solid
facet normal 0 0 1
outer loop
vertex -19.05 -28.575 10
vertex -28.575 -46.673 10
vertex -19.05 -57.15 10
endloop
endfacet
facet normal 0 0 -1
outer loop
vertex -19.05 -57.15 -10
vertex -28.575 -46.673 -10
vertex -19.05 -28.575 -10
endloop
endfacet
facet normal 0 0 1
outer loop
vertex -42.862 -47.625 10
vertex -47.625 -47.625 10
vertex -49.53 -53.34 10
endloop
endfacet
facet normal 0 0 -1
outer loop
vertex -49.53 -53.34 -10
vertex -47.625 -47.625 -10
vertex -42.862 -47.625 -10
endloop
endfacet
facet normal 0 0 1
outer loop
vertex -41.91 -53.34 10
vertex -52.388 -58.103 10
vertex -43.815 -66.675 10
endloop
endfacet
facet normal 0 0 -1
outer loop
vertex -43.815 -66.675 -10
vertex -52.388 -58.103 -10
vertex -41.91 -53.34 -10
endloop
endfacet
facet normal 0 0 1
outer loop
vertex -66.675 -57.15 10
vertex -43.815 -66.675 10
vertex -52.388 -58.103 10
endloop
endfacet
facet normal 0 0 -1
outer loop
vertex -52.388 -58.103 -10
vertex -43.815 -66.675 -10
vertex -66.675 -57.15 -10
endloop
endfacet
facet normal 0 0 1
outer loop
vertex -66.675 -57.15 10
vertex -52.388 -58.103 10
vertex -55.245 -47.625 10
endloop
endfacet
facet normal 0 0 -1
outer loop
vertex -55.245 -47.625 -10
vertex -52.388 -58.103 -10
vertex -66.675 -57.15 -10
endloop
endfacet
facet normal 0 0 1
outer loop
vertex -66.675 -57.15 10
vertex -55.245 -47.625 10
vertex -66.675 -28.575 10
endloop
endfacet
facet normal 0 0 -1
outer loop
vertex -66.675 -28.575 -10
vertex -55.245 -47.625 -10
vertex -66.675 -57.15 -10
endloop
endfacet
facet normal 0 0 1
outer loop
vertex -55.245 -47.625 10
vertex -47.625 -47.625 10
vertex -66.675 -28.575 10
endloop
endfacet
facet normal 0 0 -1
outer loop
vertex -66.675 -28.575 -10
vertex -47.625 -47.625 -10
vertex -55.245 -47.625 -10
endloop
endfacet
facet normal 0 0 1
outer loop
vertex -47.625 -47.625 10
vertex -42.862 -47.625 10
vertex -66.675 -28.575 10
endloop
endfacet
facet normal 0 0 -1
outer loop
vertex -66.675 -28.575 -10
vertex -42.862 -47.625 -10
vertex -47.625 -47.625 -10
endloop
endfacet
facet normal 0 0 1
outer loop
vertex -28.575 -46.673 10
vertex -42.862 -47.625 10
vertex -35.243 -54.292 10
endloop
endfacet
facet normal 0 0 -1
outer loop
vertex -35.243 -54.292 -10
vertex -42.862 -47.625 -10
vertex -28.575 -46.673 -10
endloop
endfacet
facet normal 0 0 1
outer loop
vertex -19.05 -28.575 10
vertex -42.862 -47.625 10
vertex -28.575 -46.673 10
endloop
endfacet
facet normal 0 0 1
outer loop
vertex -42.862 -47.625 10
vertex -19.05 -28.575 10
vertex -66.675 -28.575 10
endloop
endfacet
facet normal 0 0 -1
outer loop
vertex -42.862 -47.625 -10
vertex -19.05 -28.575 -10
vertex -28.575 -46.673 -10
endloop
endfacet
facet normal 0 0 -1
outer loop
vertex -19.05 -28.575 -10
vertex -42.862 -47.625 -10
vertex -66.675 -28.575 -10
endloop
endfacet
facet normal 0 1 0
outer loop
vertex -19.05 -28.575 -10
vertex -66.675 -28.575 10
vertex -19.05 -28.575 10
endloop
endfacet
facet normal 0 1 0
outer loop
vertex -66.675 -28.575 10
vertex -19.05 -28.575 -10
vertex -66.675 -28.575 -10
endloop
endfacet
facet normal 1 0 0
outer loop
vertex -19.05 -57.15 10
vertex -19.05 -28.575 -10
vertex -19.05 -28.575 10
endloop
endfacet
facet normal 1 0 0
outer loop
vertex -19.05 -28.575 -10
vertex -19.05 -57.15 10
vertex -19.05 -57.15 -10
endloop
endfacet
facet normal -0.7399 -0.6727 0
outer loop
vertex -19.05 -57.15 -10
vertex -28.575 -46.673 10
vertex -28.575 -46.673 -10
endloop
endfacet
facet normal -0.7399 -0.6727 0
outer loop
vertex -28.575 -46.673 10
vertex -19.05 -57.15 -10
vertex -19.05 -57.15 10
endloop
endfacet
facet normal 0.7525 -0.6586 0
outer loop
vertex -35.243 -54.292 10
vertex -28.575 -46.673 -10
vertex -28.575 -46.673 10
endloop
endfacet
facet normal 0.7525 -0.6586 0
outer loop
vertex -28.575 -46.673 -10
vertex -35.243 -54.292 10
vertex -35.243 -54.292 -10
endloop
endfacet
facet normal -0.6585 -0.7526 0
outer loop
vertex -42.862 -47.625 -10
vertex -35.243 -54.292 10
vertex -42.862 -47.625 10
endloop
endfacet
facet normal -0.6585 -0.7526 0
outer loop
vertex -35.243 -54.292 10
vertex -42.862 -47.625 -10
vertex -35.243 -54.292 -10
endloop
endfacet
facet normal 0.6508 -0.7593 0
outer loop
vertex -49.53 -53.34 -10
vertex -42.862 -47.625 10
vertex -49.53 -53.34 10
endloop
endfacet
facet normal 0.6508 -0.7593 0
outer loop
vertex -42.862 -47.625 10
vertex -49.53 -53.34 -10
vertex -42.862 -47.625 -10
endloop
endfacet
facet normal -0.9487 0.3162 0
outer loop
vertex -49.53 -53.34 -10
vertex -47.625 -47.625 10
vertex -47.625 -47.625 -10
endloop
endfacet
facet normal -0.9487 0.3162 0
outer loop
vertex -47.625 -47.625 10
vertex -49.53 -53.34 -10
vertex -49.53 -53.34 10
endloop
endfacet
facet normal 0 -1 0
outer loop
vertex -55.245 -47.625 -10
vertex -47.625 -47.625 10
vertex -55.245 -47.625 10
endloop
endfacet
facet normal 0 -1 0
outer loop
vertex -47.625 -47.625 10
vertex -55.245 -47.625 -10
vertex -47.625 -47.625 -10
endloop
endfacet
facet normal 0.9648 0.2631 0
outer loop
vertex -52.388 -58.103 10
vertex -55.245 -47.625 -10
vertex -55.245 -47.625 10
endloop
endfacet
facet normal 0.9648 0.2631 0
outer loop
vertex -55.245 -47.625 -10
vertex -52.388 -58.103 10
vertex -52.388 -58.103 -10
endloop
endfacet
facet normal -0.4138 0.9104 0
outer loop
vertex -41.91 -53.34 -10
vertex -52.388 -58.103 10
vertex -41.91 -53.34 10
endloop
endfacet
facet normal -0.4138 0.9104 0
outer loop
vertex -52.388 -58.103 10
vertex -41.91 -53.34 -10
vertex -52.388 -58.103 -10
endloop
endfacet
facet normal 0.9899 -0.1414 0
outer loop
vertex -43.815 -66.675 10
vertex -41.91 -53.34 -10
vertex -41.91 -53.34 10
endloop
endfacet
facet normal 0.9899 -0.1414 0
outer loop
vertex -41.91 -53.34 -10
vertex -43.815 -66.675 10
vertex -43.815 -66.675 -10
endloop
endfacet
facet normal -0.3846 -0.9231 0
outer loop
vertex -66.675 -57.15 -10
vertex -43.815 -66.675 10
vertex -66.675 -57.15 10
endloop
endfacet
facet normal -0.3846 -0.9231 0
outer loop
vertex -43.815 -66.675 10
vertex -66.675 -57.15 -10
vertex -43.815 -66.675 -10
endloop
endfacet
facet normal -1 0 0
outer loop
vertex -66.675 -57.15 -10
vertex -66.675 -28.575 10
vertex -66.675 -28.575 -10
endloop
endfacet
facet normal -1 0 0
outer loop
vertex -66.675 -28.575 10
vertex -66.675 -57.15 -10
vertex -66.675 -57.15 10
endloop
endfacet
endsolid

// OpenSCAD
polyhedron(
    points=[
    [-66.675, -28.575, 10],
    [-19.05, -28.575, 10],
    [-19.05, -57.15, 10],
    [-28.575, -46.6725, 10],
    [-35.2425, -54.2925, 10],
    [-42.8625, -47.625, 10],
    [-49.53, -53.34, 10],
    [-47.625, -47.625, 10],
    [-55.245, -47.625, 10],
    [-52.3875, -58.1025, 10],
    [-41.91, -53.34, 10],
    [-43.815, -66.675, 10],
    [-66.675, -57.15, 10],
    [-66.675, -28.575, -10],
    [-19.05, -28.575, -10],
    [-19.05, -57.15, -10],
    [-28.575, -46.6725, -10],
    [-35.2425, -54.2925, -10],
    [-42.8625, -47.625, -10],
    [-49.53, -53.34, -10],
    [-47.625, -47.625, -10],
    [-55.245, -47.625, -10],
    [-52.3875, -58.1025, -10],
    [-41.91, -53.34, -10],
    [-43.815, -66.675, -10],
    [-66.675, -57.15, -10],
    ],
    faces=[
        [2,3,1],
        [14,16,15],
        [6,7,5],
        [18,20,19],
        [11,9,10],
        [23,22,24],
        [9,11,12],
        [25,24,22],
        [8,9,12],
        [25,22,21],
        [0,8,12],
        [25,21,13],
        [0,7,8],
        [21,20,13],
        [0,5,7],
        [20,18,13],
        [4,5,3],
        [16,18,17],
        [3,5,0,1],
        [14,13,18,16],
        [0,13,14,1],
        [1,14,15,2],
        [2,15,16,3],
        [3,16,17,4],
        [4,17,18,5],
        [5,18,19,6],
        [6,19,20,7],
        [7,20,21,8],
        [8,21,22,9],
        [9,22,23,10],
        [10,23,24,11],
        [11,24,25,12],
        [12,25,13,0],
    ]
);
